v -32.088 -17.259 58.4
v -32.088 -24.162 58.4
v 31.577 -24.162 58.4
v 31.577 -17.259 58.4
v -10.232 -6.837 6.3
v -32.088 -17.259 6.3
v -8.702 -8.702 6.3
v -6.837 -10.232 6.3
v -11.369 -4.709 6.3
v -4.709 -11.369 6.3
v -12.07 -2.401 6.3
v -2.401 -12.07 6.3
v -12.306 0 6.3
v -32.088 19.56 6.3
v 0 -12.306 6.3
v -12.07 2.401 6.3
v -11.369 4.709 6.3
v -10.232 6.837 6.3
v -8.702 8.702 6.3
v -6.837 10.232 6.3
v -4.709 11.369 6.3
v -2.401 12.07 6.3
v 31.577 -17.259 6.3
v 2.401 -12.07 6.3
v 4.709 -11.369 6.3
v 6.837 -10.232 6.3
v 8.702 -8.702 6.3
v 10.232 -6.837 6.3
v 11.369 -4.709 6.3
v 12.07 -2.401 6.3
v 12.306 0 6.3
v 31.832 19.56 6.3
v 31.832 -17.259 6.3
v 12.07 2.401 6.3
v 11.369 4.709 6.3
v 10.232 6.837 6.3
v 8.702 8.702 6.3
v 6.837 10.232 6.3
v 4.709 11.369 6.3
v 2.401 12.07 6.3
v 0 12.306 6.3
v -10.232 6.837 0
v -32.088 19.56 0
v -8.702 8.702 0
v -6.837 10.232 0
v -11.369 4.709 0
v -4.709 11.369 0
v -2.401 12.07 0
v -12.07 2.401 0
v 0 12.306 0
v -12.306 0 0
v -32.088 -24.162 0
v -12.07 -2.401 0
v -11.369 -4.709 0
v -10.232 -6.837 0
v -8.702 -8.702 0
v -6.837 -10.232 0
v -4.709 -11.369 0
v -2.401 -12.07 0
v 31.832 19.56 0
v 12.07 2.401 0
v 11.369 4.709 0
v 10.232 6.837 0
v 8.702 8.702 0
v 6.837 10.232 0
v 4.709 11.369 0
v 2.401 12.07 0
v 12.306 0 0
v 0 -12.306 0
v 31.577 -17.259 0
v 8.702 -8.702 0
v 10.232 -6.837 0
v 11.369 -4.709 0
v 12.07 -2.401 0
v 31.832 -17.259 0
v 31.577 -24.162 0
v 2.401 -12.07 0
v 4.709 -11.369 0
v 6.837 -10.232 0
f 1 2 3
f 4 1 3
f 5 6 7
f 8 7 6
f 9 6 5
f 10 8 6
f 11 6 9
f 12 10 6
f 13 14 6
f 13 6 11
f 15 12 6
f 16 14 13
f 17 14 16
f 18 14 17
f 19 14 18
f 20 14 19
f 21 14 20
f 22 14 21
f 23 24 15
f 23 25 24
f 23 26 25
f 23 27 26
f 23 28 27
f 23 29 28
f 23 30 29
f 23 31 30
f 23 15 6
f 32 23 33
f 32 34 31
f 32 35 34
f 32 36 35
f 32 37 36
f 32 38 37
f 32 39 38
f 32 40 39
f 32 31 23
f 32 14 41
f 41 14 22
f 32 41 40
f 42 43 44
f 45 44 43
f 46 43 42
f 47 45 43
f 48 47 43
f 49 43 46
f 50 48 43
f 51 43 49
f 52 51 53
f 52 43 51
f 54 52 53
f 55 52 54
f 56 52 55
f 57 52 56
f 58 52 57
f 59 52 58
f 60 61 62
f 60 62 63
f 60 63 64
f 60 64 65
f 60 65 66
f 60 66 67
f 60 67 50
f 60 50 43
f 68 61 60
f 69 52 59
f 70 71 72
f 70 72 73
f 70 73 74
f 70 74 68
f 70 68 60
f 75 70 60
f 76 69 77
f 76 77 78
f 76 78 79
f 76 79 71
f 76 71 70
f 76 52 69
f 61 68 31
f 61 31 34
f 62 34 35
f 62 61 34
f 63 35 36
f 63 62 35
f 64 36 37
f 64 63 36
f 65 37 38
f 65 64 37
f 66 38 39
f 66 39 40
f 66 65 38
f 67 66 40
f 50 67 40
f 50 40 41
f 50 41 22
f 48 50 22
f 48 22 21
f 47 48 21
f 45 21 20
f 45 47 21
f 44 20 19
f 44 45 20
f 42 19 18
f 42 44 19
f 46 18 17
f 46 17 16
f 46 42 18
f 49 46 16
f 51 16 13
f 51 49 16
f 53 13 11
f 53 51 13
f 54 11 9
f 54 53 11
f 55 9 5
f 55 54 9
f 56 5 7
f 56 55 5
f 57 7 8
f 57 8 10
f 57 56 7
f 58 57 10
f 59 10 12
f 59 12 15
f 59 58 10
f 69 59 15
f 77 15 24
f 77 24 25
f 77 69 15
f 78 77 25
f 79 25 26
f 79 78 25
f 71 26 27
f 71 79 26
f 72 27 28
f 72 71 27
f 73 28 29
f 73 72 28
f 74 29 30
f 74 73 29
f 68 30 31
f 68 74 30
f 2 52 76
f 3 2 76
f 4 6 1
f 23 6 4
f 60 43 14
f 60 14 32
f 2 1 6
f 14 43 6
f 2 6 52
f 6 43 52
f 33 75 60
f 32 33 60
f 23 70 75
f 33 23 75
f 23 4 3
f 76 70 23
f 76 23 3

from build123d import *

# Parameters (mm, degrees)
F0_W     = 63.920457
F0_H     = 36.818182
F0_R     = 12.305973
F1_DEPTH = 6.3
F2_W     = 63.664775
F2_H     = 6.90341
F3_DEPTH = 58.4


with BuildPart() as f1:
    # F0 (on Top) → F1 (new body)
    with BuildSketch(Plane.XY):
        with Locations((-0.127842, 1.150568)):
            Rectangle(F0_W, F0_H)
        Circle(F0_R, mode=Mode.SUBTRACT)
    extrude(amount=F1_DEPTH)

    # F2 (on face) → F3 (join)
    with BuildSketch(Plane(origin=(0, 0, 0), x_dir=(1, 0, 0), z_dir=(0, 0, -1))):
        with Locations((-0.255683, 20.710228)):
            Rectangle(F2_W, F2_H)
    extrude(amount=-F3_DEPTH)


solid = f1.part
